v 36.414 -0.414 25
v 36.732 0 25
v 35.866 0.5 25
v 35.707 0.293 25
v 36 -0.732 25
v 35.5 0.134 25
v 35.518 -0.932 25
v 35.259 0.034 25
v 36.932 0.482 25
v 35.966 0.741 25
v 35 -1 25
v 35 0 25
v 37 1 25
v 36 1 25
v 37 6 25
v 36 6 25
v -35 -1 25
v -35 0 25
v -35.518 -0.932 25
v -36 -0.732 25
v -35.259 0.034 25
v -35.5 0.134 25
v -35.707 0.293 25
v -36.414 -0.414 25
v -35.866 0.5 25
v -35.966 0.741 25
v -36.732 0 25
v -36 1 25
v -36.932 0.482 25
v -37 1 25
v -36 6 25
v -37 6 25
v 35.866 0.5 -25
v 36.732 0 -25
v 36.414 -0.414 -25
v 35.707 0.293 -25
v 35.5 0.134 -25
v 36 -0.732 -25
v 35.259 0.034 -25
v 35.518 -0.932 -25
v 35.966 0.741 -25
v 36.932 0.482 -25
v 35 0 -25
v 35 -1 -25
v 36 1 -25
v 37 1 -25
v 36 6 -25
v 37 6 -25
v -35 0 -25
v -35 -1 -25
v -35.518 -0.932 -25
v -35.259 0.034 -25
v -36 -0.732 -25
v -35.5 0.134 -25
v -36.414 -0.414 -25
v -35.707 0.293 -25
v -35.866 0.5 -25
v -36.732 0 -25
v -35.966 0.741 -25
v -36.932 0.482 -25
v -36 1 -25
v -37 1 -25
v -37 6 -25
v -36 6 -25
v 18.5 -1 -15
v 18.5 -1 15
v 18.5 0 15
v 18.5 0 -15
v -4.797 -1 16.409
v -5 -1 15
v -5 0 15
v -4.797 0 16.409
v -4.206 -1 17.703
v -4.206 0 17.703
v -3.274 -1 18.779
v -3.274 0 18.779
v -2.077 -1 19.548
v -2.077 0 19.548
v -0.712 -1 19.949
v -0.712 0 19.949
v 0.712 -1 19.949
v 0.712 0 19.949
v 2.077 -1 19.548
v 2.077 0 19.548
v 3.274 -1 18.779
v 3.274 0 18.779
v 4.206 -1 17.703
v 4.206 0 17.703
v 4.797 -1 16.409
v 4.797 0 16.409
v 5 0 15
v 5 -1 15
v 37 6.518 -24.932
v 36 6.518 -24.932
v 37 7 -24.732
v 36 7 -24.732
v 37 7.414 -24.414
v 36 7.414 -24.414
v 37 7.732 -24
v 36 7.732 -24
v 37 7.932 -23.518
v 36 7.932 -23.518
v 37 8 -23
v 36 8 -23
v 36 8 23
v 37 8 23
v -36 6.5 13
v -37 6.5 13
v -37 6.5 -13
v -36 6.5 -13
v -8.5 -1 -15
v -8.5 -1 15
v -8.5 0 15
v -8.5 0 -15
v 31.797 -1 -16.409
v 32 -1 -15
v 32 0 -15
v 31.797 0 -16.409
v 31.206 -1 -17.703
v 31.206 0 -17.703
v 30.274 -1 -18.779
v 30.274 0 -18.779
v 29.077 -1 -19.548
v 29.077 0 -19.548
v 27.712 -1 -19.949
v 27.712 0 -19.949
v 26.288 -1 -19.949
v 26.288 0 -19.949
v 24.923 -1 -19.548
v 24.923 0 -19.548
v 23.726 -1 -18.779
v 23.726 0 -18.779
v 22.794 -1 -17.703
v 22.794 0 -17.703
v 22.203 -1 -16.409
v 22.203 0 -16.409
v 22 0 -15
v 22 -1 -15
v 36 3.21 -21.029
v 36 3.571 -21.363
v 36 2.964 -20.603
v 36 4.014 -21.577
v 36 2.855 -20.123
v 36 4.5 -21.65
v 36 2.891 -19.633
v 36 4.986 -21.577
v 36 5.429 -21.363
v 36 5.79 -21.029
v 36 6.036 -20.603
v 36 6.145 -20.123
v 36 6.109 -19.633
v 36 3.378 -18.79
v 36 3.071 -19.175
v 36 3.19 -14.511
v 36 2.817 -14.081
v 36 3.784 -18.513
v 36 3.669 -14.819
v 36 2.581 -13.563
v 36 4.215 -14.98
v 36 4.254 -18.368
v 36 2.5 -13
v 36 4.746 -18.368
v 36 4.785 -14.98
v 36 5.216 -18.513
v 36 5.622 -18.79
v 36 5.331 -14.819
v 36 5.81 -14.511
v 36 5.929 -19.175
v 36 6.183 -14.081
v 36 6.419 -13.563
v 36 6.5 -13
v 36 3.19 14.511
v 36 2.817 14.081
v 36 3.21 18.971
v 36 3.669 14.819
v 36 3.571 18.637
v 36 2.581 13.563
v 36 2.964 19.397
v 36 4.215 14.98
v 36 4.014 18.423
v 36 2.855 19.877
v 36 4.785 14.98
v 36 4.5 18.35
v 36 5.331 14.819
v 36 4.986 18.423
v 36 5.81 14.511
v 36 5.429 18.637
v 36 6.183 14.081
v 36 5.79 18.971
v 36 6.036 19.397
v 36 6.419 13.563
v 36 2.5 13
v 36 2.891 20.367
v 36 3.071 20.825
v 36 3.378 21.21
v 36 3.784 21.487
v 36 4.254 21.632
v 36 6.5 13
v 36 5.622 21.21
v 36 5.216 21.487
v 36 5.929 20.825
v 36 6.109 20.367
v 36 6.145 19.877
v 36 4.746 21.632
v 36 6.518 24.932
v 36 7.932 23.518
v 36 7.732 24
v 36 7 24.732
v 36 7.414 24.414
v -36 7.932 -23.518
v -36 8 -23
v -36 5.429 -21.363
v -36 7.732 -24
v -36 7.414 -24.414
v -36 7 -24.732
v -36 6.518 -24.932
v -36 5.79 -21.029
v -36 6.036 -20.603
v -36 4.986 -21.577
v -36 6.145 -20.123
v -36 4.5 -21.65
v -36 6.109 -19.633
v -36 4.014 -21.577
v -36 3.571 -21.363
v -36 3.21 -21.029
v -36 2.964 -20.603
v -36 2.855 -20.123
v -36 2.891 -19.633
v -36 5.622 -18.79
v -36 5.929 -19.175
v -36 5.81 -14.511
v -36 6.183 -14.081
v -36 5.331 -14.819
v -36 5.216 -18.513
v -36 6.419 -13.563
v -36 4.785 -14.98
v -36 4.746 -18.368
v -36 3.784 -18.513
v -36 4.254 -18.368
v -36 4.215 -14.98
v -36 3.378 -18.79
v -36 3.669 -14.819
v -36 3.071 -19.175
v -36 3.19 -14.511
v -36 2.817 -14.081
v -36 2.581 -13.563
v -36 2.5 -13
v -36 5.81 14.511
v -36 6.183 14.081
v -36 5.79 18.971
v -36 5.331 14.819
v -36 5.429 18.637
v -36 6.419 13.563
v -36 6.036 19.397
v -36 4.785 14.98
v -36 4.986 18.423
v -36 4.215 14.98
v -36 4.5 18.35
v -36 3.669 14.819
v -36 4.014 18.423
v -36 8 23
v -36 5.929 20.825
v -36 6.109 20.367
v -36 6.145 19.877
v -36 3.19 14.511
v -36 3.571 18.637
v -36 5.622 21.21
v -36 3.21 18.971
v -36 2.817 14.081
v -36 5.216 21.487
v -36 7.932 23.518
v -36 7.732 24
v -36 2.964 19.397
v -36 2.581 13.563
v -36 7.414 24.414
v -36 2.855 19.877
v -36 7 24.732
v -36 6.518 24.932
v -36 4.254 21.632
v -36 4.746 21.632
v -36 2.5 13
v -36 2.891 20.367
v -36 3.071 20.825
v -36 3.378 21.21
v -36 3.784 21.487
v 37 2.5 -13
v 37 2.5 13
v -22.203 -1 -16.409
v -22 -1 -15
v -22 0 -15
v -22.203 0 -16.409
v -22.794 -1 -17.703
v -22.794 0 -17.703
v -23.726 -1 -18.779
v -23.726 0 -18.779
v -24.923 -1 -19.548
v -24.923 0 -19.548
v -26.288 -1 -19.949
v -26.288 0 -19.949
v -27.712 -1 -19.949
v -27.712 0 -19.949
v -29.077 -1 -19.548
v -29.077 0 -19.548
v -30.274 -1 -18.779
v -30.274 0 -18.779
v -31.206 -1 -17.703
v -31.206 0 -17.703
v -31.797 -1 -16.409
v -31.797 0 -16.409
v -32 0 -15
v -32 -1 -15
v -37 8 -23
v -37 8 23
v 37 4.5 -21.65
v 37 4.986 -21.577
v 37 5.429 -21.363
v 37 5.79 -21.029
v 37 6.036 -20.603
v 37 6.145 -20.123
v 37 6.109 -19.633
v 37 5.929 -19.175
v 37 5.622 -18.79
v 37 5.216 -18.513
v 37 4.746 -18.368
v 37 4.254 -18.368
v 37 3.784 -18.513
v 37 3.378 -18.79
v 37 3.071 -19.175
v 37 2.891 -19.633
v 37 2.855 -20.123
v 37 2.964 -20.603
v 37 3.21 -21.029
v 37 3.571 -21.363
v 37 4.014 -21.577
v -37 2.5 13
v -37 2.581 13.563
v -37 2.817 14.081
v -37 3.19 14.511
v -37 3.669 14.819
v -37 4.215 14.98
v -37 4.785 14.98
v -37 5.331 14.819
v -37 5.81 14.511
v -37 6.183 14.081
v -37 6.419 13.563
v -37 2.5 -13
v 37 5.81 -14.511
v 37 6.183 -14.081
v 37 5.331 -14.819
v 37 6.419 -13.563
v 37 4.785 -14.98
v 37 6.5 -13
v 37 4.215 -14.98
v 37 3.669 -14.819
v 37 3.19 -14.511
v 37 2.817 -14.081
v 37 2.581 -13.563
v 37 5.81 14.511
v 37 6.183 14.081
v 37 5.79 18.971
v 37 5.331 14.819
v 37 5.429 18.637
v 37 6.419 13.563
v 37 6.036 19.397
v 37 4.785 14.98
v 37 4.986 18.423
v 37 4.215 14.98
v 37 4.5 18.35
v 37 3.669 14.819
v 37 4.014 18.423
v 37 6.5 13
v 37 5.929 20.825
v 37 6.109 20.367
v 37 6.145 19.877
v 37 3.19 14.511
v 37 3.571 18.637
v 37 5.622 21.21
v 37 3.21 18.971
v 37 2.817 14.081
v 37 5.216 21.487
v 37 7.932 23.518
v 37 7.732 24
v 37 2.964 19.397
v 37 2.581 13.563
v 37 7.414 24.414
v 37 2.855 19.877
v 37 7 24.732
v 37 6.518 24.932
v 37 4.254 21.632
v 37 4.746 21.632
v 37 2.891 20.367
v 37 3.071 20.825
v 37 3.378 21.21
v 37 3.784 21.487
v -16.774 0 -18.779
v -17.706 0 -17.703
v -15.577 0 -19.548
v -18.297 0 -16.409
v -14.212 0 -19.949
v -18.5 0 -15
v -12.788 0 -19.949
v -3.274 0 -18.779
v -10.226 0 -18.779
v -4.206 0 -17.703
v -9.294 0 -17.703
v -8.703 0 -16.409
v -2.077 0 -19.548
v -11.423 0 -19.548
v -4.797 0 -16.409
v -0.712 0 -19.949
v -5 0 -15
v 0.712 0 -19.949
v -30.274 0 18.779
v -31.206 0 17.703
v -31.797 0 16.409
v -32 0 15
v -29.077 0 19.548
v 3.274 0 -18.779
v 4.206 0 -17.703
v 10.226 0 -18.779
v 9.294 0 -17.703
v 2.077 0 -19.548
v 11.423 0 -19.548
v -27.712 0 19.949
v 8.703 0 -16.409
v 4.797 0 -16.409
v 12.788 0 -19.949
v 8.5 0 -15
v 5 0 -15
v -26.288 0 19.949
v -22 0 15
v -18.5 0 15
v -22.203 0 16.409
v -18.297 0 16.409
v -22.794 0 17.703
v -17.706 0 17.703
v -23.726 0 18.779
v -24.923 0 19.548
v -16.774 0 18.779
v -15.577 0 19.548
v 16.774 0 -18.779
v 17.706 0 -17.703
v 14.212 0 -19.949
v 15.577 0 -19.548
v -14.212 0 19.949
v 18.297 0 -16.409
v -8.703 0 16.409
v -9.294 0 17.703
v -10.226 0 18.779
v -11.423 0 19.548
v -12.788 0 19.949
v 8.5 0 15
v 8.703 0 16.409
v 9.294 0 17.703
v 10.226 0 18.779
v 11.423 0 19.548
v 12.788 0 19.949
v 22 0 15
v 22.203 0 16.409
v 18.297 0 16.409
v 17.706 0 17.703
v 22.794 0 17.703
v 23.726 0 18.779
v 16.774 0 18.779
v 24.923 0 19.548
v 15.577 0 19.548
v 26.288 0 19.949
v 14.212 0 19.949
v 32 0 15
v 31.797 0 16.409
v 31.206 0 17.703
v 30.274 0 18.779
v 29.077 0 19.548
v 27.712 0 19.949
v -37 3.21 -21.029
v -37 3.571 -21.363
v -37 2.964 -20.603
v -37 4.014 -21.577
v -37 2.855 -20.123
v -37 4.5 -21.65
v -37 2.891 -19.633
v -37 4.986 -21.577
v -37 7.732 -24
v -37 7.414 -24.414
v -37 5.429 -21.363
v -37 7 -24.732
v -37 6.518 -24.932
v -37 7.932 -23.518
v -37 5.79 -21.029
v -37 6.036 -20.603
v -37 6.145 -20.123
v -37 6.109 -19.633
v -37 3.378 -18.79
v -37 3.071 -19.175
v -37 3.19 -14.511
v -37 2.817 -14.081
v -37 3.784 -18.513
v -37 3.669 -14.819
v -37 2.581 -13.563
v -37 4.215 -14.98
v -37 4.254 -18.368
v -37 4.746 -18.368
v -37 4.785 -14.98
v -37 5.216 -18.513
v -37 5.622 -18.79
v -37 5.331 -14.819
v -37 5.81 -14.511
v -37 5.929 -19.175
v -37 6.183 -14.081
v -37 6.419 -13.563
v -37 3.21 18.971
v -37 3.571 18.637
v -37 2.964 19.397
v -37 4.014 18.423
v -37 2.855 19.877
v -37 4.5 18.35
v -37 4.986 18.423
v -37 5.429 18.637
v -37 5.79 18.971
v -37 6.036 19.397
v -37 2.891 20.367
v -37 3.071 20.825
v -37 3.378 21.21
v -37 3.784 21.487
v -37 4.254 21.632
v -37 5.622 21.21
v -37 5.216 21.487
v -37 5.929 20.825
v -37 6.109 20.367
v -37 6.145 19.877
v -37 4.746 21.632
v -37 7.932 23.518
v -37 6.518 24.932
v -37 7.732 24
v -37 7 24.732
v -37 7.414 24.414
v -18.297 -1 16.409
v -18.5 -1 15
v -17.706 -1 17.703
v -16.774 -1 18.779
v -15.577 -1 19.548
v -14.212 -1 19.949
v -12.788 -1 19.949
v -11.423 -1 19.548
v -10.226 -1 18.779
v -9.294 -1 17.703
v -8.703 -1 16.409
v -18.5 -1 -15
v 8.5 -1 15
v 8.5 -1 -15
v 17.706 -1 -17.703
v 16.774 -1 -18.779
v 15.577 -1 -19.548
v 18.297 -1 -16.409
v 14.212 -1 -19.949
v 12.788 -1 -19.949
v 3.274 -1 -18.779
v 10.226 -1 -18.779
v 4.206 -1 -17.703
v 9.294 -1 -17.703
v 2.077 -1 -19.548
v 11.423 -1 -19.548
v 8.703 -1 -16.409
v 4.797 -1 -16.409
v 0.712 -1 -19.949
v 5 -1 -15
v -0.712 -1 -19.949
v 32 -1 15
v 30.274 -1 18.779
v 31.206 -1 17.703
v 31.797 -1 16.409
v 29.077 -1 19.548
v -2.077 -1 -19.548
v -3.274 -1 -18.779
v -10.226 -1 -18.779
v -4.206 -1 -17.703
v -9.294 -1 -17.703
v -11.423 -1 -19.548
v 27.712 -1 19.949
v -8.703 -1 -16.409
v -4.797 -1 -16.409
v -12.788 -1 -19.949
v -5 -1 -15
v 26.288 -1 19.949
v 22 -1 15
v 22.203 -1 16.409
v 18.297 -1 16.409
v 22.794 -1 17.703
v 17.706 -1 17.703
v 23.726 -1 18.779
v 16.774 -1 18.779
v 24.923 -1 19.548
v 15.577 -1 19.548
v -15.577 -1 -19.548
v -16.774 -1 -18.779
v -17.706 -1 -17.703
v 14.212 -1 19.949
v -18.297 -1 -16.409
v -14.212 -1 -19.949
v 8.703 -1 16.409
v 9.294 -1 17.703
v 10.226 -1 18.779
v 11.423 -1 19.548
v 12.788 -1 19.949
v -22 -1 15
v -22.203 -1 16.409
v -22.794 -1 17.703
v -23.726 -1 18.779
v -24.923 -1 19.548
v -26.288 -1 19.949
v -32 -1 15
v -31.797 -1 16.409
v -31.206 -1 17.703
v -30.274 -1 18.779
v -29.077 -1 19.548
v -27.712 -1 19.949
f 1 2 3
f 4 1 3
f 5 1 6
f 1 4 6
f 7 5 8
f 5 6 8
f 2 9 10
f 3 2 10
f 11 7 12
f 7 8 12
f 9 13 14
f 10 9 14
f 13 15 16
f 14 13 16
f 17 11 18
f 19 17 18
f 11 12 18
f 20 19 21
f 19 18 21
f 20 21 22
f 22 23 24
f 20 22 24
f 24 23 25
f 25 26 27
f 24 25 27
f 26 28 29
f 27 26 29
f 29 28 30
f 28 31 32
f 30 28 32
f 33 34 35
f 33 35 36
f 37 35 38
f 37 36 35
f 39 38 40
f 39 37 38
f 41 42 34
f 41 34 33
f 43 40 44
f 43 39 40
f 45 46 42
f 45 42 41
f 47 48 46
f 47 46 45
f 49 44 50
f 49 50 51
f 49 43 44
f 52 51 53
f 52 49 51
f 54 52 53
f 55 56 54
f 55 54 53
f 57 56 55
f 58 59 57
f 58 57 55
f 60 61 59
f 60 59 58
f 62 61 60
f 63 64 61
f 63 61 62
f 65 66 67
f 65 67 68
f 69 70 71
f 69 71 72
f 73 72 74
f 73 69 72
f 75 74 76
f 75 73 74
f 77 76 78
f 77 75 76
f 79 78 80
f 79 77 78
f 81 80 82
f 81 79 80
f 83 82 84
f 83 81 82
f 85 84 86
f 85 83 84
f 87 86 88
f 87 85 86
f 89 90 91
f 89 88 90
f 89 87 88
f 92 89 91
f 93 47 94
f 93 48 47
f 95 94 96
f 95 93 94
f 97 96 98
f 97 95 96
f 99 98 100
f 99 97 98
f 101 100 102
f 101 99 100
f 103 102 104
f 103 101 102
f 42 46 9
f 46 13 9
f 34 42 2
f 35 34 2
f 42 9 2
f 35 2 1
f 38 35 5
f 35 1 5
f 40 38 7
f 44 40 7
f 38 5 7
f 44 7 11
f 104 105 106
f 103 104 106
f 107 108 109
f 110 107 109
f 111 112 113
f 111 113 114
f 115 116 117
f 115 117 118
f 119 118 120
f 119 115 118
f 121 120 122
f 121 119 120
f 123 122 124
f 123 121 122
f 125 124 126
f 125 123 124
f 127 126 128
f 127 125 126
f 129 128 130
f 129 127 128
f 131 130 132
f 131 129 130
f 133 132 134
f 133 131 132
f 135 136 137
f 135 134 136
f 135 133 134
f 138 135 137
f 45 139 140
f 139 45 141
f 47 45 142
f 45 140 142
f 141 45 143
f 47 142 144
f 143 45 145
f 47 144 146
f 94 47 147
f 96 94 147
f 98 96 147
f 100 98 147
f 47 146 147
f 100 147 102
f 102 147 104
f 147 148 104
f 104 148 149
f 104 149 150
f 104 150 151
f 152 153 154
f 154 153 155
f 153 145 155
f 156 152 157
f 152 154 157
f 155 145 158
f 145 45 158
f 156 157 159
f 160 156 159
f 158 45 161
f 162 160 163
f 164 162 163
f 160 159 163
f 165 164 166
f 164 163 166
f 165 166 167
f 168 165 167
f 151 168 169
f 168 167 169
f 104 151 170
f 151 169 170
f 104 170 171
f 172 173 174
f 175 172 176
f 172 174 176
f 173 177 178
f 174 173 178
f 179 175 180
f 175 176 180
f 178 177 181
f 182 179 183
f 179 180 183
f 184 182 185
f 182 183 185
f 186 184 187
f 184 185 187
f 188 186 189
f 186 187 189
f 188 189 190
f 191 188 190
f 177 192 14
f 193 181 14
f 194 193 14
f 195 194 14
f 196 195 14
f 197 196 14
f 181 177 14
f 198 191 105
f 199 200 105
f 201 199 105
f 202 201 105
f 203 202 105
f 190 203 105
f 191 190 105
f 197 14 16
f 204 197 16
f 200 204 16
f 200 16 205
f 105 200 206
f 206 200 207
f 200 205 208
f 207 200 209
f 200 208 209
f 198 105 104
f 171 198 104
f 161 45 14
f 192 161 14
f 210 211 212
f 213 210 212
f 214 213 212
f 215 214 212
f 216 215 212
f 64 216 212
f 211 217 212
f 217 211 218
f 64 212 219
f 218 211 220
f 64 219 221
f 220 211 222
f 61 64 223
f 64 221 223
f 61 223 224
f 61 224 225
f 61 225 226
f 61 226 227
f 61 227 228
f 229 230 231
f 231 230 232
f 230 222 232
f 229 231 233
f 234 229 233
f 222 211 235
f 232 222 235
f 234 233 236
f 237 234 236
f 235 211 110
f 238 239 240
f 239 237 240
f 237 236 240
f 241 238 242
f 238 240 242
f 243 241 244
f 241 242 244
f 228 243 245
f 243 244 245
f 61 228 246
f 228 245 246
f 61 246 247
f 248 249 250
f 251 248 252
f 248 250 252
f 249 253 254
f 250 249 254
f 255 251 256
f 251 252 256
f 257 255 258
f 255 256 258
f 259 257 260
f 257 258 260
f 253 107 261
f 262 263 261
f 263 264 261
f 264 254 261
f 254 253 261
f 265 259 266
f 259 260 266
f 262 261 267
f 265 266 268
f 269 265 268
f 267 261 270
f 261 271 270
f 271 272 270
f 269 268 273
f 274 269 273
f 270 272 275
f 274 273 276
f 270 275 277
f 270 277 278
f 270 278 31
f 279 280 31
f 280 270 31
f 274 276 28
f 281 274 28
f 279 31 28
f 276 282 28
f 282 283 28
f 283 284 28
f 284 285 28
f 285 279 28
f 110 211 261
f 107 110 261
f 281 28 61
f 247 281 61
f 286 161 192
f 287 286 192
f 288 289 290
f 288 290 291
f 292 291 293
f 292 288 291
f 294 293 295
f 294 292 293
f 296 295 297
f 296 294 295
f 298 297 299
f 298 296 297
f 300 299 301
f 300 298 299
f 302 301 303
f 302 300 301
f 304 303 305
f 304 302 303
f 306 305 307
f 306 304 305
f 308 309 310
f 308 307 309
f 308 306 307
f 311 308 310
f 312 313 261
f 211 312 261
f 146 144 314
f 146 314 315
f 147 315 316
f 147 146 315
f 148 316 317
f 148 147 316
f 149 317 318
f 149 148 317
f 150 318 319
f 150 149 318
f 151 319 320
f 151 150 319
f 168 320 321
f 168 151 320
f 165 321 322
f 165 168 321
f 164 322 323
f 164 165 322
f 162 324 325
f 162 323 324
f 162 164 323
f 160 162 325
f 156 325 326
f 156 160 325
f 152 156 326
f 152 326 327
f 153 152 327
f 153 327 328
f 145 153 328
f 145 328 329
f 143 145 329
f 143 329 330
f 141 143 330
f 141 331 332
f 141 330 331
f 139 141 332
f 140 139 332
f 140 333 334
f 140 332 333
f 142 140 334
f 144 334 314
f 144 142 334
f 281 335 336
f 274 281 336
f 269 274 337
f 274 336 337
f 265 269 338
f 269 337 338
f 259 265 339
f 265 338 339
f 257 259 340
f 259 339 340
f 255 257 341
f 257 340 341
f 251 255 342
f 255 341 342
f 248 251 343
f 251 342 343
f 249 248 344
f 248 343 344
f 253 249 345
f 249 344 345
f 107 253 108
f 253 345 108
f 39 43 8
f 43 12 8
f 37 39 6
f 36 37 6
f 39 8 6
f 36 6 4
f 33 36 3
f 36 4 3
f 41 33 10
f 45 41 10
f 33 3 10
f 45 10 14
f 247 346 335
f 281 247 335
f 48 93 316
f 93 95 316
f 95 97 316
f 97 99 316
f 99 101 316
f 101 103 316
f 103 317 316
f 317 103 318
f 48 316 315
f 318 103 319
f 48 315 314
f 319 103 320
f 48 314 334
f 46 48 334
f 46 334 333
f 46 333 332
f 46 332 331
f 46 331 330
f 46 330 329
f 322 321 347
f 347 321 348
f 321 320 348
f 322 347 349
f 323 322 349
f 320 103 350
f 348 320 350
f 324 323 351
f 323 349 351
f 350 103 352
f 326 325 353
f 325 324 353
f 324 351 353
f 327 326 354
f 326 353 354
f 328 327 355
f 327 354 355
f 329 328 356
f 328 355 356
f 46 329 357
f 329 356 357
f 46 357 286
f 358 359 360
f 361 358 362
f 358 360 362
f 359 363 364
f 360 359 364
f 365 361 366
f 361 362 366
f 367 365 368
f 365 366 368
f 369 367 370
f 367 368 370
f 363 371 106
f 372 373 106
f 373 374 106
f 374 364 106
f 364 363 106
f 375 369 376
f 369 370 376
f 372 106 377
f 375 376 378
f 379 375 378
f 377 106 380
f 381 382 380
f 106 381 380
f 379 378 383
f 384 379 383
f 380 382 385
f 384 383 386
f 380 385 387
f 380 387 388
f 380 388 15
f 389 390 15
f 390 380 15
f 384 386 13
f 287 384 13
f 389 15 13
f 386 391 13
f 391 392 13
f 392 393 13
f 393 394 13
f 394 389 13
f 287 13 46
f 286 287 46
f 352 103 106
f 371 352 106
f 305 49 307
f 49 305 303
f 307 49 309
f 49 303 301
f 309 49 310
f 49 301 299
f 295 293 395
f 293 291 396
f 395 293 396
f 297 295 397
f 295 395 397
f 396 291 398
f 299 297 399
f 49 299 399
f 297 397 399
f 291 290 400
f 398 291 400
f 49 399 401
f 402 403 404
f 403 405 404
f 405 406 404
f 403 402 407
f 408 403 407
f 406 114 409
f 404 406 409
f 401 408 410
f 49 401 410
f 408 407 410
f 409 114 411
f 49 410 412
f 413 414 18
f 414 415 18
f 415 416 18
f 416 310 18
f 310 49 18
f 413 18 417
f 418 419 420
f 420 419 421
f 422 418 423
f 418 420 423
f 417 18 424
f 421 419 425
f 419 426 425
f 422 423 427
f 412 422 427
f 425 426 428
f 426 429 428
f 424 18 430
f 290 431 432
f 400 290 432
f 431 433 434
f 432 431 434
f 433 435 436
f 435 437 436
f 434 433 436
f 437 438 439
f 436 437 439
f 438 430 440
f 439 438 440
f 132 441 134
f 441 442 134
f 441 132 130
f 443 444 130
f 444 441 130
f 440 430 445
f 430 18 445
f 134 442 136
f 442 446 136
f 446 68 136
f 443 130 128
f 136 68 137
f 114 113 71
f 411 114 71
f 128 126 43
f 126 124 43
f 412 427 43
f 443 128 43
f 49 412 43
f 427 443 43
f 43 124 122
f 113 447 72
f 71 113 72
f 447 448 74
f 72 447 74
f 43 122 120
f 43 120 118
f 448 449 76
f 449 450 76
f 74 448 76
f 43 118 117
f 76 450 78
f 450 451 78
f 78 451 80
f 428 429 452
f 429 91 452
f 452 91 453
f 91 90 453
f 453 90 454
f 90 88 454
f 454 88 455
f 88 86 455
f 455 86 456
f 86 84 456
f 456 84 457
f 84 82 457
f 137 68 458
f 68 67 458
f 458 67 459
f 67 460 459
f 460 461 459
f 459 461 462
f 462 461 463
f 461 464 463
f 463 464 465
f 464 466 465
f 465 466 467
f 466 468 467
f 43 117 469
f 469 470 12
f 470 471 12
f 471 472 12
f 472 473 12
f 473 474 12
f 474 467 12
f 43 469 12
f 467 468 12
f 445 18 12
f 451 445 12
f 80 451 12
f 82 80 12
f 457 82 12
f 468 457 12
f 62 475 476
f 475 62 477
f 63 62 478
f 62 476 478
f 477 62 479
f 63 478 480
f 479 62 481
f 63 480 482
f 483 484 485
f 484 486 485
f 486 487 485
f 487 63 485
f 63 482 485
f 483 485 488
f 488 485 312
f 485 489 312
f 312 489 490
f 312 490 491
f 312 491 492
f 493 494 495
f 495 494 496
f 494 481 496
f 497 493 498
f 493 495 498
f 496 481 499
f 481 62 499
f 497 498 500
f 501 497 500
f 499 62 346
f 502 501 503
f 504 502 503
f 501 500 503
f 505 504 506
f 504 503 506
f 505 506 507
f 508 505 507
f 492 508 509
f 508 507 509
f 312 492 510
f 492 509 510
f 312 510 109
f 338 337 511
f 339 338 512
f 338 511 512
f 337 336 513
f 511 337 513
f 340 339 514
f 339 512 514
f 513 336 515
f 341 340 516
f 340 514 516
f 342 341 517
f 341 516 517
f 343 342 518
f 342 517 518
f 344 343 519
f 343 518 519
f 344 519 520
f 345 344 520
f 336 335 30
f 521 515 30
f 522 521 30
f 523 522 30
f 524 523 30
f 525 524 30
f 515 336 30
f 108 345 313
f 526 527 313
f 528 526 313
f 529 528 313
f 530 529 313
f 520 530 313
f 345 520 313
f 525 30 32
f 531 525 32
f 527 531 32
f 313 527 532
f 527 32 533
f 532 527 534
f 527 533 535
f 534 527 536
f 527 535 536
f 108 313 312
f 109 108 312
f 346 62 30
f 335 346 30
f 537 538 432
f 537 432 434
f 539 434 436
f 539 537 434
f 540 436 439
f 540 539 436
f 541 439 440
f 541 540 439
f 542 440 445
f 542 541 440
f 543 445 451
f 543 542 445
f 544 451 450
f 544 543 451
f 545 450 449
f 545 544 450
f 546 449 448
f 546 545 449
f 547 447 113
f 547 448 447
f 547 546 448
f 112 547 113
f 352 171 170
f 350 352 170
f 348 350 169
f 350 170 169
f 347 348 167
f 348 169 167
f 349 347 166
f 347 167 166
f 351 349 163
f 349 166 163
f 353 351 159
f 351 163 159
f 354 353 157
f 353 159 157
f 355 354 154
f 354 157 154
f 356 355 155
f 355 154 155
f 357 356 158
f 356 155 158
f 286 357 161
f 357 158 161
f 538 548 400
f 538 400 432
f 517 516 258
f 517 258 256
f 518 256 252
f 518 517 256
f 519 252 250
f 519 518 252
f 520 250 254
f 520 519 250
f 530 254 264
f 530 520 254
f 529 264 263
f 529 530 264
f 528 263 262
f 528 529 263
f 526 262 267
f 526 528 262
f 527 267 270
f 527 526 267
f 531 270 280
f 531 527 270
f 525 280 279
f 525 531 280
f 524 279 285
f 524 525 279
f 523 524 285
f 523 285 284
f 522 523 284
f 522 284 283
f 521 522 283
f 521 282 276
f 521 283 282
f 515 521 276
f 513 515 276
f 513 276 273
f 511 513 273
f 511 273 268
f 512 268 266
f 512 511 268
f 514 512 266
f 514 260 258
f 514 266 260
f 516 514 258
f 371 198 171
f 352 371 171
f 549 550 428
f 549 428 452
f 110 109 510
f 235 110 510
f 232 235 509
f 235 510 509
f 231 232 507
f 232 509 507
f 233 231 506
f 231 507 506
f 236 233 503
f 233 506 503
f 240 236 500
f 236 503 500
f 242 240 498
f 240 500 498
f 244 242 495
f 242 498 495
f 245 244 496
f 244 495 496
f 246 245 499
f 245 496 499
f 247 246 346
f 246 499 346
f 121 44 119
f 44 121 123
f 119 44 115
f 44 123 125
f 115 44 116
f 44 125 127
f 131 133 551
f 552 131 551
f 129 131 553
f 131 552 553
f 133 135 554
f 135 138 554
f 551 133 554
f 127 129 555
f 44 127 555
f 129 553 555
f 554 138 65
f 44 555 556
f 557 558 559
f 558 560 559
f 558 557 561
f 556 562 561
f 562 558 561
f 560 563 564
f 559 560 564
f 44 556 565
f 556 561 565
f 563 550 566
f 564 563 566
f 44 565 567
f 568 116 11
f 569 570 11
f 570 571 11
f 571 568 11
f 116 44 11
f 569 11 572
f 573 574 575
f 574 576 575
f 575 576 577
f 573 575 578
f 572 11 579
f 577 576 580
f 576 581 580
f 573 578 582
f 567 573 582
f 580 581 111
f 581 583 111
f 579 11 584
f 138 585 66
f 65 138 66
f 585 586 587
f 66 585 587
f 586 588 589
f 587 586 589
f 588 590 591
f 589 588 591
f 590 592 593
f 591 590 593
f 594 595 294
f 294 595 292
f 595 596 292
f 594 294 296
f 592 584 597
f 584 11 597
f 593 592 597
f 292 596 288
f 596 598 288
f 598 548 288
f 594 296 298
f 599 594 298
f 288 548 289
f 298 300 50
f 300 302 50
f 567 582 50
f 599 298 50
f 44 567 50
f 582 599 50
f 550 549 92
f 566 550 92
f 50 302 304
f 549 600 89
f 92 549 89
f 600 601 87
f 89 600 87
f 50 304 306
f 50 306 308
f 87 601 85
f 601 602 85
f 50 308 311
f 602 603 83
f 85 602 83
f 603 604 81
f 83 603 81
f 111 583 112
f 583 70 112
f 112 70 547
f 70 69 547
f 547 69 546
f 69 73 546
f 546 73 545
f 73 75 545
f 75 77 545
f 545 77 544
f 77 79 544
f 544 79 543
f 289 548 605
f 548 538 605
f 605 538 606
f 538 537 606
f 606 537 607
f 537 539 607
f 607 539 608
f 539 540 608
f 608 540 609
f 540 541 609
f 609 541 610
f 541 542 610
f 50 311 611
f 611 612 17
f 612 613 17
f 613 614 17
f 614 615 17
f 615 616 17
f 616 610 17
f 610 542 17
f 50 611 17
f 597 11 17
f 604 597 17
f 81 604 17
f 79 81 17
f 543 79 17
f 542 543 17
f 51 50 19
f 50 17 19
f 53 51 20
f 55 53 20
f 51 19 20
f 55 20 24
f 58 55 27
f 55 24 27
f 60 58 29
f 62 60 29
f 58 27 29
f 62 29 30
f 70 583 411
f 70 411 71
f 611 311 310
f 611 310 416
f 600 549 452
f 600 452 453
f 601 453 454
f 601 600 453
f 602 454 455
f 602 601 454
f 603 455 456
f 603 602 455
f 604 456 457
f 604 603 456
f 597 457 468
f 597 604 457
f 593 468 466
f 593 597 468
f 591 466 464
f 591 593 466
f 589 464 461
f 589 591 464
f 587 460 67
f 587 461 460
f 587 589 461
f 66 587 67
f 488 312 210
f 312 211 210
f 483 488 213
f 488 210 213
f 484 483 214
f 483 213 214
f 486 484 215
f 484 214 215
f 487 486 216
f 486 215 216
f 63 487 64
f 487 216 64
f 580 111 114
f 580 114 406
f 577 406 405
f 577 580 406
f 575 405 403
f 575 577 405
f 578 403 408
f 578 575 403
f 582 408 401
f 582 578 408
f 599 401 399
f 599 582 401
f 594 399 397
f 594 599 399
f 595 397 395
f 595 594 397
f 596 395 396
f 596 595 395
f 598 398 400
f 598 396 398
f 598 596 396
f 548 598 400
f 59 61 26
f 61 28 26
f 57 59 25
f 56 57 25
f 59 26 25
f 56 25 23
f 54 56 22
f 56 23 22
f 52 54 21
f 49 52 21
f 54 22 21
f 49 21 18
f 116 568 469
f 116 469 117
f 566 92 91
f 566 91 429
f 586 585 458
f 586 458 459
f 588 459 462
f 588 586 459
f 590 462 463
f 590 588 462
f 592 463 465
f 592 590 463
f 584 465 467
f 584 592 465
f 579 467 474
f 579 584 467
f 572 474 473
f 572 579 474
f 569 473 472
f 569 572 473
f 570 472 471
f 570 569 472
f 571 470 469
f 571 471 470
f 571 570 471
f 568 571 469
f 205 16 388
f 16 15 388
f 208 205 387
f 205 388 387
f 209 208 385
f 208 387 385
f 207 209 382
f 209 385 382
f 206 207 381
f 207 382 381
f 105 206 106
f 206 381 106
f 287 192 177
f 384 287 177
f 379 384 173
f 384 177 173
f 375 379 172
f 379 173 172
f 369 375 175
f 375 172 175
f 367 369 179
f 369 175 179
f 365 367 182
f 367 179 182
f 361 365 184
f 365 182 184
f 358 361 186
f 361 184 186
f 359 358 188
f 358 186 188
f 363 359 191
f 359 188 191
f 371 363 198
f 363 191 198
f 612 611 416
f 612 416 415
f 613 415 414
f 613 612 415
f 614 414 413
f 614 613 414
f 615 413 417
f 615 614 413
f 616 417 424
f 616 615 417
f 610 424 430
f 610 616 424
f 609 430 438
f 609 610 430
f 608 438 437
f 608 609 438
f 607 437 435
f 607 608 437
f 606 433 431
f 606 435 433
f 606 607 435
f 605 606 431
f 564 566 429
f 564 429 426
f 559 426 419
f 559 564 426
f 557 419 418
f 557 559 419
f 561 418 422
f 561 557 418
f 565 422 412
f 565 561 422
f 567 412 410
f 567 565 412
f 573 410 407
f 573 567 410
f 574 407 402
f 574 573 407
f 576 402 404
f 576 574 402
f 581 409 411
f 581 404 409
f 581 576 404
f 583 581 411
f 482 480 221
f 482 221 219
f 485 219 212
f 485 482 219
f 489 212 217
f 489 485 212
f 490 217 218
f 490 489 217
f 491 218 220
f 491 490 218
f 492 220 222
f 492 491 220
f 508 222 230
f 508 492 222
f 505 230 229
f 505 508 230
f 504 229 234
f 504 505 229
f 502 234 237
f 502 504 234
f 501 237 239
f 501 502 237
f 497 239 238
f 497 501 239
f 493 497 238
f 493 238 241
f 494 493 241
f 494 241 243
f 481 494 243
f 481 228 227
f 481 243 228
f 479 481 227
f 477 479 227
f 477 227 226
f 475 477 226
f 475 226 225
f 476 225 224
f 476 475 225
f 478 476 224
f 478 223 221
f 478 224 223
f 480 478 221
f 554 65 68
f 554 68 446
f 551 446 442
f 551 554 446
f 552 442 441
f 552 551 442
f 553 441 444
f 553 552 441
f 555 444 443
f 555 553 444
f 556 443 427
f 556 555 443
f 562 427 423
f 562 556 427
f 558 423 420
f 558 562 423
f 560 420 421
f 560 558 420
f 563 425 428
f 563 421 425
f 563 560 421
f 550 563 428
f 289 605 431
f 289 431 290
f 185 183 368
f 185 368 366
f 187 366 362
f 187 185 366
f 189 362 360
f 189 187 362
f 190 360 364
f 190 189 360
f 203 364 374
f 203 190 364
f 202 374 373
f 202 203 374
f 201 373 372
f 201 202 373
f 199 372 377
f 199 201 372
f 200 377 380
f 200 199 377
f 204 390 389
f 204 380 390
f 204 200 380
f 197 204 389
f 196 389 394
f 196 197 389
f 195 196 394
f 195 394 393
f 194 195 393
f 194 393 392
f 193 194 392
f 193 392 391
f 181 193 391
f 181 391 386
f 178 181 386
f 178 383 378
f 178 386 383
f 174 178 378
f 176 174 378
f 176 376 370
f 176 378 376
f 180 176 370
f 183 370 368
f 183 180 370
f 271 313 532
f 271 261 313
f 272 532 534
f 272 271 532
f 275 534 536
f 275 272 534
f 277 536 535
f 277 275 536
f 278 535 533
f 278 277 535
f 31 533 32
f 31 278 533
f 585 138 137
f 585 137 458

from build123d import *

# Parameters (mm, degrees)
SM_BASE_FLANGE_1_DEPTH   = 25
CUT_EXTRUDE_1_DEPTH      = 46.365184889
CUT_EXTRUDE_1_DEPTH_BACK = 46.365184889
SKETCH_6_R               = 1.65
CUT_EXTRUDE_2_DEPTH      = 10
FILLET_1_R               = 2


# Sheet-metal steps are written as plain solids
with BuildPart() as part:
    # Sketch 1 → 基体-法兰1 (new, symmetric)
    with BuildSketch(Plane.XY):
        with BuildLine():
            Line((-36, 8), (-36, 1))
            ThreePointArc((-36, 1), (-35.707106781, 0.292893219), (-35, 0))
            Line((-35, 0), (35, 0))
            ThreePointArc((35, 0), (35.707106781, 0.292893219), (36, 1))
            Line((36, 1), (36, 8))
            Line((36, 8), (37, 8))
            Line((37, 8), (37, 1))
            ThreePointArc((37, 1), (36.414213562, -0.414213562), (35, -1))
            Line((35, -1), (-35, -1))
            ThreePointArc((-35, -1), (-36.414213562, -0.414213562), (-37, 1))
            Line((-37, 1), (-37, 8))
            Line((-37, 8), (-36, 8))
        make_face()
    extrude(amount=SM_BASE_FLANGE_1_DEPTH, both=True)

    # 草图6 → 切除-拉伸1 (cut, two sides: drawn at the far end of the back side and taken through both)
    with BuildSketch(Plane(origin=(0, 0, 0), x_dir=(0, 0, -1), z_dir=(1, 0, 0)).offset(-CUT_EXTRUDE_1_DEPTH_BACK)):
        with Locations((-20, 4.5)):
            Circle(SKETCH_6_R)
        with Locations((20, 4.5)):
            Circle(SKETCH_6_R)
        with BuildLine():
            Line((-13, 6.5), (13, 6.5))
            ThreePointArc((13, 6.5), (15, 4.5), (13, 2.5))
            Line((13, 2.5), (-13, 2.5))
            ThreePointArc((-13, 2.5), (-15, 4.5), (-13, 6.5))
        make_face()
    extrude(amount=CUT_EXTRUDE_1_DEPTH + CUT_EXTRUDE_1_DEPTH_BACK, mode=Mode.SUBTRACT)

    # 草图7 → 切除-拉伸2 (cut)
    with BuildSketch(Plane.XZ.offset(1)):
        with BuildLine():
            Line((-22, 15), (-22, -15))
            ThreePointArc((-22, -15), (-27, -20), (-32, -15))
            Line((-32, -15), (-32, 15))
            ThreePointArc((-32, 15), (-27, 20), (-22, 15))
        make_face()
        with BuildLine():
            Line((-8.5, 15), (-8.5, -15))
            ThreePointArc((-8.5, -15), (-13.5, -20), (-18.5, -15))
            Line((-18.5, -15), (-18.5, 15))
            ThreePointArc((-18.5, 15), (-13.5, 20), (-8.5, 15))
        make_face()
        with BuildLine():
            Line((5, 15), (5, -15))
            ThreePointArc((5, -15), (0, -20), (-5, -15))
            Line((-5, -15), (-5, 15))
            ThreePointArc((-5, 15), (0, 20), (5, 15))
        make_face()
        with BuildLine():
            Line((18.5, 15), (18.5, -15))
            ThreePointArc((18.5, -15), (13.5, -20), (8.5, -15))
            Line((8.5, -15), (8.5, 15))
            ThreePointArc((8.5, 15), (13.5, 20), (18.5, 15))
        make_face()
        with BuildLine():
            Line((32, 15), (32, -15))
            ThreePointArc((32, -15), (27, -20), (22, -15))
            Line((22, -15), (22, 15))
            ThreePointArc((22, 15), (27, 20), (32, 15))
        make_face()
    extrude(amount=-CUT_EXTRUDE_2_DEPTH, mode=Mode.SUBTRACT)

    # 圆角1
    fillet_1_edges = [part.edges().sort_by_distance(p)[0] for p in [
        (-36.5, 8, -25),
        (36.5, 8, -25),
        (-36.5, 8, 25),
        (36.5, 8, 25),
    ]]
    fillet(fillet_1_edges, radius=FILLET_1_R)


solid = part.part
